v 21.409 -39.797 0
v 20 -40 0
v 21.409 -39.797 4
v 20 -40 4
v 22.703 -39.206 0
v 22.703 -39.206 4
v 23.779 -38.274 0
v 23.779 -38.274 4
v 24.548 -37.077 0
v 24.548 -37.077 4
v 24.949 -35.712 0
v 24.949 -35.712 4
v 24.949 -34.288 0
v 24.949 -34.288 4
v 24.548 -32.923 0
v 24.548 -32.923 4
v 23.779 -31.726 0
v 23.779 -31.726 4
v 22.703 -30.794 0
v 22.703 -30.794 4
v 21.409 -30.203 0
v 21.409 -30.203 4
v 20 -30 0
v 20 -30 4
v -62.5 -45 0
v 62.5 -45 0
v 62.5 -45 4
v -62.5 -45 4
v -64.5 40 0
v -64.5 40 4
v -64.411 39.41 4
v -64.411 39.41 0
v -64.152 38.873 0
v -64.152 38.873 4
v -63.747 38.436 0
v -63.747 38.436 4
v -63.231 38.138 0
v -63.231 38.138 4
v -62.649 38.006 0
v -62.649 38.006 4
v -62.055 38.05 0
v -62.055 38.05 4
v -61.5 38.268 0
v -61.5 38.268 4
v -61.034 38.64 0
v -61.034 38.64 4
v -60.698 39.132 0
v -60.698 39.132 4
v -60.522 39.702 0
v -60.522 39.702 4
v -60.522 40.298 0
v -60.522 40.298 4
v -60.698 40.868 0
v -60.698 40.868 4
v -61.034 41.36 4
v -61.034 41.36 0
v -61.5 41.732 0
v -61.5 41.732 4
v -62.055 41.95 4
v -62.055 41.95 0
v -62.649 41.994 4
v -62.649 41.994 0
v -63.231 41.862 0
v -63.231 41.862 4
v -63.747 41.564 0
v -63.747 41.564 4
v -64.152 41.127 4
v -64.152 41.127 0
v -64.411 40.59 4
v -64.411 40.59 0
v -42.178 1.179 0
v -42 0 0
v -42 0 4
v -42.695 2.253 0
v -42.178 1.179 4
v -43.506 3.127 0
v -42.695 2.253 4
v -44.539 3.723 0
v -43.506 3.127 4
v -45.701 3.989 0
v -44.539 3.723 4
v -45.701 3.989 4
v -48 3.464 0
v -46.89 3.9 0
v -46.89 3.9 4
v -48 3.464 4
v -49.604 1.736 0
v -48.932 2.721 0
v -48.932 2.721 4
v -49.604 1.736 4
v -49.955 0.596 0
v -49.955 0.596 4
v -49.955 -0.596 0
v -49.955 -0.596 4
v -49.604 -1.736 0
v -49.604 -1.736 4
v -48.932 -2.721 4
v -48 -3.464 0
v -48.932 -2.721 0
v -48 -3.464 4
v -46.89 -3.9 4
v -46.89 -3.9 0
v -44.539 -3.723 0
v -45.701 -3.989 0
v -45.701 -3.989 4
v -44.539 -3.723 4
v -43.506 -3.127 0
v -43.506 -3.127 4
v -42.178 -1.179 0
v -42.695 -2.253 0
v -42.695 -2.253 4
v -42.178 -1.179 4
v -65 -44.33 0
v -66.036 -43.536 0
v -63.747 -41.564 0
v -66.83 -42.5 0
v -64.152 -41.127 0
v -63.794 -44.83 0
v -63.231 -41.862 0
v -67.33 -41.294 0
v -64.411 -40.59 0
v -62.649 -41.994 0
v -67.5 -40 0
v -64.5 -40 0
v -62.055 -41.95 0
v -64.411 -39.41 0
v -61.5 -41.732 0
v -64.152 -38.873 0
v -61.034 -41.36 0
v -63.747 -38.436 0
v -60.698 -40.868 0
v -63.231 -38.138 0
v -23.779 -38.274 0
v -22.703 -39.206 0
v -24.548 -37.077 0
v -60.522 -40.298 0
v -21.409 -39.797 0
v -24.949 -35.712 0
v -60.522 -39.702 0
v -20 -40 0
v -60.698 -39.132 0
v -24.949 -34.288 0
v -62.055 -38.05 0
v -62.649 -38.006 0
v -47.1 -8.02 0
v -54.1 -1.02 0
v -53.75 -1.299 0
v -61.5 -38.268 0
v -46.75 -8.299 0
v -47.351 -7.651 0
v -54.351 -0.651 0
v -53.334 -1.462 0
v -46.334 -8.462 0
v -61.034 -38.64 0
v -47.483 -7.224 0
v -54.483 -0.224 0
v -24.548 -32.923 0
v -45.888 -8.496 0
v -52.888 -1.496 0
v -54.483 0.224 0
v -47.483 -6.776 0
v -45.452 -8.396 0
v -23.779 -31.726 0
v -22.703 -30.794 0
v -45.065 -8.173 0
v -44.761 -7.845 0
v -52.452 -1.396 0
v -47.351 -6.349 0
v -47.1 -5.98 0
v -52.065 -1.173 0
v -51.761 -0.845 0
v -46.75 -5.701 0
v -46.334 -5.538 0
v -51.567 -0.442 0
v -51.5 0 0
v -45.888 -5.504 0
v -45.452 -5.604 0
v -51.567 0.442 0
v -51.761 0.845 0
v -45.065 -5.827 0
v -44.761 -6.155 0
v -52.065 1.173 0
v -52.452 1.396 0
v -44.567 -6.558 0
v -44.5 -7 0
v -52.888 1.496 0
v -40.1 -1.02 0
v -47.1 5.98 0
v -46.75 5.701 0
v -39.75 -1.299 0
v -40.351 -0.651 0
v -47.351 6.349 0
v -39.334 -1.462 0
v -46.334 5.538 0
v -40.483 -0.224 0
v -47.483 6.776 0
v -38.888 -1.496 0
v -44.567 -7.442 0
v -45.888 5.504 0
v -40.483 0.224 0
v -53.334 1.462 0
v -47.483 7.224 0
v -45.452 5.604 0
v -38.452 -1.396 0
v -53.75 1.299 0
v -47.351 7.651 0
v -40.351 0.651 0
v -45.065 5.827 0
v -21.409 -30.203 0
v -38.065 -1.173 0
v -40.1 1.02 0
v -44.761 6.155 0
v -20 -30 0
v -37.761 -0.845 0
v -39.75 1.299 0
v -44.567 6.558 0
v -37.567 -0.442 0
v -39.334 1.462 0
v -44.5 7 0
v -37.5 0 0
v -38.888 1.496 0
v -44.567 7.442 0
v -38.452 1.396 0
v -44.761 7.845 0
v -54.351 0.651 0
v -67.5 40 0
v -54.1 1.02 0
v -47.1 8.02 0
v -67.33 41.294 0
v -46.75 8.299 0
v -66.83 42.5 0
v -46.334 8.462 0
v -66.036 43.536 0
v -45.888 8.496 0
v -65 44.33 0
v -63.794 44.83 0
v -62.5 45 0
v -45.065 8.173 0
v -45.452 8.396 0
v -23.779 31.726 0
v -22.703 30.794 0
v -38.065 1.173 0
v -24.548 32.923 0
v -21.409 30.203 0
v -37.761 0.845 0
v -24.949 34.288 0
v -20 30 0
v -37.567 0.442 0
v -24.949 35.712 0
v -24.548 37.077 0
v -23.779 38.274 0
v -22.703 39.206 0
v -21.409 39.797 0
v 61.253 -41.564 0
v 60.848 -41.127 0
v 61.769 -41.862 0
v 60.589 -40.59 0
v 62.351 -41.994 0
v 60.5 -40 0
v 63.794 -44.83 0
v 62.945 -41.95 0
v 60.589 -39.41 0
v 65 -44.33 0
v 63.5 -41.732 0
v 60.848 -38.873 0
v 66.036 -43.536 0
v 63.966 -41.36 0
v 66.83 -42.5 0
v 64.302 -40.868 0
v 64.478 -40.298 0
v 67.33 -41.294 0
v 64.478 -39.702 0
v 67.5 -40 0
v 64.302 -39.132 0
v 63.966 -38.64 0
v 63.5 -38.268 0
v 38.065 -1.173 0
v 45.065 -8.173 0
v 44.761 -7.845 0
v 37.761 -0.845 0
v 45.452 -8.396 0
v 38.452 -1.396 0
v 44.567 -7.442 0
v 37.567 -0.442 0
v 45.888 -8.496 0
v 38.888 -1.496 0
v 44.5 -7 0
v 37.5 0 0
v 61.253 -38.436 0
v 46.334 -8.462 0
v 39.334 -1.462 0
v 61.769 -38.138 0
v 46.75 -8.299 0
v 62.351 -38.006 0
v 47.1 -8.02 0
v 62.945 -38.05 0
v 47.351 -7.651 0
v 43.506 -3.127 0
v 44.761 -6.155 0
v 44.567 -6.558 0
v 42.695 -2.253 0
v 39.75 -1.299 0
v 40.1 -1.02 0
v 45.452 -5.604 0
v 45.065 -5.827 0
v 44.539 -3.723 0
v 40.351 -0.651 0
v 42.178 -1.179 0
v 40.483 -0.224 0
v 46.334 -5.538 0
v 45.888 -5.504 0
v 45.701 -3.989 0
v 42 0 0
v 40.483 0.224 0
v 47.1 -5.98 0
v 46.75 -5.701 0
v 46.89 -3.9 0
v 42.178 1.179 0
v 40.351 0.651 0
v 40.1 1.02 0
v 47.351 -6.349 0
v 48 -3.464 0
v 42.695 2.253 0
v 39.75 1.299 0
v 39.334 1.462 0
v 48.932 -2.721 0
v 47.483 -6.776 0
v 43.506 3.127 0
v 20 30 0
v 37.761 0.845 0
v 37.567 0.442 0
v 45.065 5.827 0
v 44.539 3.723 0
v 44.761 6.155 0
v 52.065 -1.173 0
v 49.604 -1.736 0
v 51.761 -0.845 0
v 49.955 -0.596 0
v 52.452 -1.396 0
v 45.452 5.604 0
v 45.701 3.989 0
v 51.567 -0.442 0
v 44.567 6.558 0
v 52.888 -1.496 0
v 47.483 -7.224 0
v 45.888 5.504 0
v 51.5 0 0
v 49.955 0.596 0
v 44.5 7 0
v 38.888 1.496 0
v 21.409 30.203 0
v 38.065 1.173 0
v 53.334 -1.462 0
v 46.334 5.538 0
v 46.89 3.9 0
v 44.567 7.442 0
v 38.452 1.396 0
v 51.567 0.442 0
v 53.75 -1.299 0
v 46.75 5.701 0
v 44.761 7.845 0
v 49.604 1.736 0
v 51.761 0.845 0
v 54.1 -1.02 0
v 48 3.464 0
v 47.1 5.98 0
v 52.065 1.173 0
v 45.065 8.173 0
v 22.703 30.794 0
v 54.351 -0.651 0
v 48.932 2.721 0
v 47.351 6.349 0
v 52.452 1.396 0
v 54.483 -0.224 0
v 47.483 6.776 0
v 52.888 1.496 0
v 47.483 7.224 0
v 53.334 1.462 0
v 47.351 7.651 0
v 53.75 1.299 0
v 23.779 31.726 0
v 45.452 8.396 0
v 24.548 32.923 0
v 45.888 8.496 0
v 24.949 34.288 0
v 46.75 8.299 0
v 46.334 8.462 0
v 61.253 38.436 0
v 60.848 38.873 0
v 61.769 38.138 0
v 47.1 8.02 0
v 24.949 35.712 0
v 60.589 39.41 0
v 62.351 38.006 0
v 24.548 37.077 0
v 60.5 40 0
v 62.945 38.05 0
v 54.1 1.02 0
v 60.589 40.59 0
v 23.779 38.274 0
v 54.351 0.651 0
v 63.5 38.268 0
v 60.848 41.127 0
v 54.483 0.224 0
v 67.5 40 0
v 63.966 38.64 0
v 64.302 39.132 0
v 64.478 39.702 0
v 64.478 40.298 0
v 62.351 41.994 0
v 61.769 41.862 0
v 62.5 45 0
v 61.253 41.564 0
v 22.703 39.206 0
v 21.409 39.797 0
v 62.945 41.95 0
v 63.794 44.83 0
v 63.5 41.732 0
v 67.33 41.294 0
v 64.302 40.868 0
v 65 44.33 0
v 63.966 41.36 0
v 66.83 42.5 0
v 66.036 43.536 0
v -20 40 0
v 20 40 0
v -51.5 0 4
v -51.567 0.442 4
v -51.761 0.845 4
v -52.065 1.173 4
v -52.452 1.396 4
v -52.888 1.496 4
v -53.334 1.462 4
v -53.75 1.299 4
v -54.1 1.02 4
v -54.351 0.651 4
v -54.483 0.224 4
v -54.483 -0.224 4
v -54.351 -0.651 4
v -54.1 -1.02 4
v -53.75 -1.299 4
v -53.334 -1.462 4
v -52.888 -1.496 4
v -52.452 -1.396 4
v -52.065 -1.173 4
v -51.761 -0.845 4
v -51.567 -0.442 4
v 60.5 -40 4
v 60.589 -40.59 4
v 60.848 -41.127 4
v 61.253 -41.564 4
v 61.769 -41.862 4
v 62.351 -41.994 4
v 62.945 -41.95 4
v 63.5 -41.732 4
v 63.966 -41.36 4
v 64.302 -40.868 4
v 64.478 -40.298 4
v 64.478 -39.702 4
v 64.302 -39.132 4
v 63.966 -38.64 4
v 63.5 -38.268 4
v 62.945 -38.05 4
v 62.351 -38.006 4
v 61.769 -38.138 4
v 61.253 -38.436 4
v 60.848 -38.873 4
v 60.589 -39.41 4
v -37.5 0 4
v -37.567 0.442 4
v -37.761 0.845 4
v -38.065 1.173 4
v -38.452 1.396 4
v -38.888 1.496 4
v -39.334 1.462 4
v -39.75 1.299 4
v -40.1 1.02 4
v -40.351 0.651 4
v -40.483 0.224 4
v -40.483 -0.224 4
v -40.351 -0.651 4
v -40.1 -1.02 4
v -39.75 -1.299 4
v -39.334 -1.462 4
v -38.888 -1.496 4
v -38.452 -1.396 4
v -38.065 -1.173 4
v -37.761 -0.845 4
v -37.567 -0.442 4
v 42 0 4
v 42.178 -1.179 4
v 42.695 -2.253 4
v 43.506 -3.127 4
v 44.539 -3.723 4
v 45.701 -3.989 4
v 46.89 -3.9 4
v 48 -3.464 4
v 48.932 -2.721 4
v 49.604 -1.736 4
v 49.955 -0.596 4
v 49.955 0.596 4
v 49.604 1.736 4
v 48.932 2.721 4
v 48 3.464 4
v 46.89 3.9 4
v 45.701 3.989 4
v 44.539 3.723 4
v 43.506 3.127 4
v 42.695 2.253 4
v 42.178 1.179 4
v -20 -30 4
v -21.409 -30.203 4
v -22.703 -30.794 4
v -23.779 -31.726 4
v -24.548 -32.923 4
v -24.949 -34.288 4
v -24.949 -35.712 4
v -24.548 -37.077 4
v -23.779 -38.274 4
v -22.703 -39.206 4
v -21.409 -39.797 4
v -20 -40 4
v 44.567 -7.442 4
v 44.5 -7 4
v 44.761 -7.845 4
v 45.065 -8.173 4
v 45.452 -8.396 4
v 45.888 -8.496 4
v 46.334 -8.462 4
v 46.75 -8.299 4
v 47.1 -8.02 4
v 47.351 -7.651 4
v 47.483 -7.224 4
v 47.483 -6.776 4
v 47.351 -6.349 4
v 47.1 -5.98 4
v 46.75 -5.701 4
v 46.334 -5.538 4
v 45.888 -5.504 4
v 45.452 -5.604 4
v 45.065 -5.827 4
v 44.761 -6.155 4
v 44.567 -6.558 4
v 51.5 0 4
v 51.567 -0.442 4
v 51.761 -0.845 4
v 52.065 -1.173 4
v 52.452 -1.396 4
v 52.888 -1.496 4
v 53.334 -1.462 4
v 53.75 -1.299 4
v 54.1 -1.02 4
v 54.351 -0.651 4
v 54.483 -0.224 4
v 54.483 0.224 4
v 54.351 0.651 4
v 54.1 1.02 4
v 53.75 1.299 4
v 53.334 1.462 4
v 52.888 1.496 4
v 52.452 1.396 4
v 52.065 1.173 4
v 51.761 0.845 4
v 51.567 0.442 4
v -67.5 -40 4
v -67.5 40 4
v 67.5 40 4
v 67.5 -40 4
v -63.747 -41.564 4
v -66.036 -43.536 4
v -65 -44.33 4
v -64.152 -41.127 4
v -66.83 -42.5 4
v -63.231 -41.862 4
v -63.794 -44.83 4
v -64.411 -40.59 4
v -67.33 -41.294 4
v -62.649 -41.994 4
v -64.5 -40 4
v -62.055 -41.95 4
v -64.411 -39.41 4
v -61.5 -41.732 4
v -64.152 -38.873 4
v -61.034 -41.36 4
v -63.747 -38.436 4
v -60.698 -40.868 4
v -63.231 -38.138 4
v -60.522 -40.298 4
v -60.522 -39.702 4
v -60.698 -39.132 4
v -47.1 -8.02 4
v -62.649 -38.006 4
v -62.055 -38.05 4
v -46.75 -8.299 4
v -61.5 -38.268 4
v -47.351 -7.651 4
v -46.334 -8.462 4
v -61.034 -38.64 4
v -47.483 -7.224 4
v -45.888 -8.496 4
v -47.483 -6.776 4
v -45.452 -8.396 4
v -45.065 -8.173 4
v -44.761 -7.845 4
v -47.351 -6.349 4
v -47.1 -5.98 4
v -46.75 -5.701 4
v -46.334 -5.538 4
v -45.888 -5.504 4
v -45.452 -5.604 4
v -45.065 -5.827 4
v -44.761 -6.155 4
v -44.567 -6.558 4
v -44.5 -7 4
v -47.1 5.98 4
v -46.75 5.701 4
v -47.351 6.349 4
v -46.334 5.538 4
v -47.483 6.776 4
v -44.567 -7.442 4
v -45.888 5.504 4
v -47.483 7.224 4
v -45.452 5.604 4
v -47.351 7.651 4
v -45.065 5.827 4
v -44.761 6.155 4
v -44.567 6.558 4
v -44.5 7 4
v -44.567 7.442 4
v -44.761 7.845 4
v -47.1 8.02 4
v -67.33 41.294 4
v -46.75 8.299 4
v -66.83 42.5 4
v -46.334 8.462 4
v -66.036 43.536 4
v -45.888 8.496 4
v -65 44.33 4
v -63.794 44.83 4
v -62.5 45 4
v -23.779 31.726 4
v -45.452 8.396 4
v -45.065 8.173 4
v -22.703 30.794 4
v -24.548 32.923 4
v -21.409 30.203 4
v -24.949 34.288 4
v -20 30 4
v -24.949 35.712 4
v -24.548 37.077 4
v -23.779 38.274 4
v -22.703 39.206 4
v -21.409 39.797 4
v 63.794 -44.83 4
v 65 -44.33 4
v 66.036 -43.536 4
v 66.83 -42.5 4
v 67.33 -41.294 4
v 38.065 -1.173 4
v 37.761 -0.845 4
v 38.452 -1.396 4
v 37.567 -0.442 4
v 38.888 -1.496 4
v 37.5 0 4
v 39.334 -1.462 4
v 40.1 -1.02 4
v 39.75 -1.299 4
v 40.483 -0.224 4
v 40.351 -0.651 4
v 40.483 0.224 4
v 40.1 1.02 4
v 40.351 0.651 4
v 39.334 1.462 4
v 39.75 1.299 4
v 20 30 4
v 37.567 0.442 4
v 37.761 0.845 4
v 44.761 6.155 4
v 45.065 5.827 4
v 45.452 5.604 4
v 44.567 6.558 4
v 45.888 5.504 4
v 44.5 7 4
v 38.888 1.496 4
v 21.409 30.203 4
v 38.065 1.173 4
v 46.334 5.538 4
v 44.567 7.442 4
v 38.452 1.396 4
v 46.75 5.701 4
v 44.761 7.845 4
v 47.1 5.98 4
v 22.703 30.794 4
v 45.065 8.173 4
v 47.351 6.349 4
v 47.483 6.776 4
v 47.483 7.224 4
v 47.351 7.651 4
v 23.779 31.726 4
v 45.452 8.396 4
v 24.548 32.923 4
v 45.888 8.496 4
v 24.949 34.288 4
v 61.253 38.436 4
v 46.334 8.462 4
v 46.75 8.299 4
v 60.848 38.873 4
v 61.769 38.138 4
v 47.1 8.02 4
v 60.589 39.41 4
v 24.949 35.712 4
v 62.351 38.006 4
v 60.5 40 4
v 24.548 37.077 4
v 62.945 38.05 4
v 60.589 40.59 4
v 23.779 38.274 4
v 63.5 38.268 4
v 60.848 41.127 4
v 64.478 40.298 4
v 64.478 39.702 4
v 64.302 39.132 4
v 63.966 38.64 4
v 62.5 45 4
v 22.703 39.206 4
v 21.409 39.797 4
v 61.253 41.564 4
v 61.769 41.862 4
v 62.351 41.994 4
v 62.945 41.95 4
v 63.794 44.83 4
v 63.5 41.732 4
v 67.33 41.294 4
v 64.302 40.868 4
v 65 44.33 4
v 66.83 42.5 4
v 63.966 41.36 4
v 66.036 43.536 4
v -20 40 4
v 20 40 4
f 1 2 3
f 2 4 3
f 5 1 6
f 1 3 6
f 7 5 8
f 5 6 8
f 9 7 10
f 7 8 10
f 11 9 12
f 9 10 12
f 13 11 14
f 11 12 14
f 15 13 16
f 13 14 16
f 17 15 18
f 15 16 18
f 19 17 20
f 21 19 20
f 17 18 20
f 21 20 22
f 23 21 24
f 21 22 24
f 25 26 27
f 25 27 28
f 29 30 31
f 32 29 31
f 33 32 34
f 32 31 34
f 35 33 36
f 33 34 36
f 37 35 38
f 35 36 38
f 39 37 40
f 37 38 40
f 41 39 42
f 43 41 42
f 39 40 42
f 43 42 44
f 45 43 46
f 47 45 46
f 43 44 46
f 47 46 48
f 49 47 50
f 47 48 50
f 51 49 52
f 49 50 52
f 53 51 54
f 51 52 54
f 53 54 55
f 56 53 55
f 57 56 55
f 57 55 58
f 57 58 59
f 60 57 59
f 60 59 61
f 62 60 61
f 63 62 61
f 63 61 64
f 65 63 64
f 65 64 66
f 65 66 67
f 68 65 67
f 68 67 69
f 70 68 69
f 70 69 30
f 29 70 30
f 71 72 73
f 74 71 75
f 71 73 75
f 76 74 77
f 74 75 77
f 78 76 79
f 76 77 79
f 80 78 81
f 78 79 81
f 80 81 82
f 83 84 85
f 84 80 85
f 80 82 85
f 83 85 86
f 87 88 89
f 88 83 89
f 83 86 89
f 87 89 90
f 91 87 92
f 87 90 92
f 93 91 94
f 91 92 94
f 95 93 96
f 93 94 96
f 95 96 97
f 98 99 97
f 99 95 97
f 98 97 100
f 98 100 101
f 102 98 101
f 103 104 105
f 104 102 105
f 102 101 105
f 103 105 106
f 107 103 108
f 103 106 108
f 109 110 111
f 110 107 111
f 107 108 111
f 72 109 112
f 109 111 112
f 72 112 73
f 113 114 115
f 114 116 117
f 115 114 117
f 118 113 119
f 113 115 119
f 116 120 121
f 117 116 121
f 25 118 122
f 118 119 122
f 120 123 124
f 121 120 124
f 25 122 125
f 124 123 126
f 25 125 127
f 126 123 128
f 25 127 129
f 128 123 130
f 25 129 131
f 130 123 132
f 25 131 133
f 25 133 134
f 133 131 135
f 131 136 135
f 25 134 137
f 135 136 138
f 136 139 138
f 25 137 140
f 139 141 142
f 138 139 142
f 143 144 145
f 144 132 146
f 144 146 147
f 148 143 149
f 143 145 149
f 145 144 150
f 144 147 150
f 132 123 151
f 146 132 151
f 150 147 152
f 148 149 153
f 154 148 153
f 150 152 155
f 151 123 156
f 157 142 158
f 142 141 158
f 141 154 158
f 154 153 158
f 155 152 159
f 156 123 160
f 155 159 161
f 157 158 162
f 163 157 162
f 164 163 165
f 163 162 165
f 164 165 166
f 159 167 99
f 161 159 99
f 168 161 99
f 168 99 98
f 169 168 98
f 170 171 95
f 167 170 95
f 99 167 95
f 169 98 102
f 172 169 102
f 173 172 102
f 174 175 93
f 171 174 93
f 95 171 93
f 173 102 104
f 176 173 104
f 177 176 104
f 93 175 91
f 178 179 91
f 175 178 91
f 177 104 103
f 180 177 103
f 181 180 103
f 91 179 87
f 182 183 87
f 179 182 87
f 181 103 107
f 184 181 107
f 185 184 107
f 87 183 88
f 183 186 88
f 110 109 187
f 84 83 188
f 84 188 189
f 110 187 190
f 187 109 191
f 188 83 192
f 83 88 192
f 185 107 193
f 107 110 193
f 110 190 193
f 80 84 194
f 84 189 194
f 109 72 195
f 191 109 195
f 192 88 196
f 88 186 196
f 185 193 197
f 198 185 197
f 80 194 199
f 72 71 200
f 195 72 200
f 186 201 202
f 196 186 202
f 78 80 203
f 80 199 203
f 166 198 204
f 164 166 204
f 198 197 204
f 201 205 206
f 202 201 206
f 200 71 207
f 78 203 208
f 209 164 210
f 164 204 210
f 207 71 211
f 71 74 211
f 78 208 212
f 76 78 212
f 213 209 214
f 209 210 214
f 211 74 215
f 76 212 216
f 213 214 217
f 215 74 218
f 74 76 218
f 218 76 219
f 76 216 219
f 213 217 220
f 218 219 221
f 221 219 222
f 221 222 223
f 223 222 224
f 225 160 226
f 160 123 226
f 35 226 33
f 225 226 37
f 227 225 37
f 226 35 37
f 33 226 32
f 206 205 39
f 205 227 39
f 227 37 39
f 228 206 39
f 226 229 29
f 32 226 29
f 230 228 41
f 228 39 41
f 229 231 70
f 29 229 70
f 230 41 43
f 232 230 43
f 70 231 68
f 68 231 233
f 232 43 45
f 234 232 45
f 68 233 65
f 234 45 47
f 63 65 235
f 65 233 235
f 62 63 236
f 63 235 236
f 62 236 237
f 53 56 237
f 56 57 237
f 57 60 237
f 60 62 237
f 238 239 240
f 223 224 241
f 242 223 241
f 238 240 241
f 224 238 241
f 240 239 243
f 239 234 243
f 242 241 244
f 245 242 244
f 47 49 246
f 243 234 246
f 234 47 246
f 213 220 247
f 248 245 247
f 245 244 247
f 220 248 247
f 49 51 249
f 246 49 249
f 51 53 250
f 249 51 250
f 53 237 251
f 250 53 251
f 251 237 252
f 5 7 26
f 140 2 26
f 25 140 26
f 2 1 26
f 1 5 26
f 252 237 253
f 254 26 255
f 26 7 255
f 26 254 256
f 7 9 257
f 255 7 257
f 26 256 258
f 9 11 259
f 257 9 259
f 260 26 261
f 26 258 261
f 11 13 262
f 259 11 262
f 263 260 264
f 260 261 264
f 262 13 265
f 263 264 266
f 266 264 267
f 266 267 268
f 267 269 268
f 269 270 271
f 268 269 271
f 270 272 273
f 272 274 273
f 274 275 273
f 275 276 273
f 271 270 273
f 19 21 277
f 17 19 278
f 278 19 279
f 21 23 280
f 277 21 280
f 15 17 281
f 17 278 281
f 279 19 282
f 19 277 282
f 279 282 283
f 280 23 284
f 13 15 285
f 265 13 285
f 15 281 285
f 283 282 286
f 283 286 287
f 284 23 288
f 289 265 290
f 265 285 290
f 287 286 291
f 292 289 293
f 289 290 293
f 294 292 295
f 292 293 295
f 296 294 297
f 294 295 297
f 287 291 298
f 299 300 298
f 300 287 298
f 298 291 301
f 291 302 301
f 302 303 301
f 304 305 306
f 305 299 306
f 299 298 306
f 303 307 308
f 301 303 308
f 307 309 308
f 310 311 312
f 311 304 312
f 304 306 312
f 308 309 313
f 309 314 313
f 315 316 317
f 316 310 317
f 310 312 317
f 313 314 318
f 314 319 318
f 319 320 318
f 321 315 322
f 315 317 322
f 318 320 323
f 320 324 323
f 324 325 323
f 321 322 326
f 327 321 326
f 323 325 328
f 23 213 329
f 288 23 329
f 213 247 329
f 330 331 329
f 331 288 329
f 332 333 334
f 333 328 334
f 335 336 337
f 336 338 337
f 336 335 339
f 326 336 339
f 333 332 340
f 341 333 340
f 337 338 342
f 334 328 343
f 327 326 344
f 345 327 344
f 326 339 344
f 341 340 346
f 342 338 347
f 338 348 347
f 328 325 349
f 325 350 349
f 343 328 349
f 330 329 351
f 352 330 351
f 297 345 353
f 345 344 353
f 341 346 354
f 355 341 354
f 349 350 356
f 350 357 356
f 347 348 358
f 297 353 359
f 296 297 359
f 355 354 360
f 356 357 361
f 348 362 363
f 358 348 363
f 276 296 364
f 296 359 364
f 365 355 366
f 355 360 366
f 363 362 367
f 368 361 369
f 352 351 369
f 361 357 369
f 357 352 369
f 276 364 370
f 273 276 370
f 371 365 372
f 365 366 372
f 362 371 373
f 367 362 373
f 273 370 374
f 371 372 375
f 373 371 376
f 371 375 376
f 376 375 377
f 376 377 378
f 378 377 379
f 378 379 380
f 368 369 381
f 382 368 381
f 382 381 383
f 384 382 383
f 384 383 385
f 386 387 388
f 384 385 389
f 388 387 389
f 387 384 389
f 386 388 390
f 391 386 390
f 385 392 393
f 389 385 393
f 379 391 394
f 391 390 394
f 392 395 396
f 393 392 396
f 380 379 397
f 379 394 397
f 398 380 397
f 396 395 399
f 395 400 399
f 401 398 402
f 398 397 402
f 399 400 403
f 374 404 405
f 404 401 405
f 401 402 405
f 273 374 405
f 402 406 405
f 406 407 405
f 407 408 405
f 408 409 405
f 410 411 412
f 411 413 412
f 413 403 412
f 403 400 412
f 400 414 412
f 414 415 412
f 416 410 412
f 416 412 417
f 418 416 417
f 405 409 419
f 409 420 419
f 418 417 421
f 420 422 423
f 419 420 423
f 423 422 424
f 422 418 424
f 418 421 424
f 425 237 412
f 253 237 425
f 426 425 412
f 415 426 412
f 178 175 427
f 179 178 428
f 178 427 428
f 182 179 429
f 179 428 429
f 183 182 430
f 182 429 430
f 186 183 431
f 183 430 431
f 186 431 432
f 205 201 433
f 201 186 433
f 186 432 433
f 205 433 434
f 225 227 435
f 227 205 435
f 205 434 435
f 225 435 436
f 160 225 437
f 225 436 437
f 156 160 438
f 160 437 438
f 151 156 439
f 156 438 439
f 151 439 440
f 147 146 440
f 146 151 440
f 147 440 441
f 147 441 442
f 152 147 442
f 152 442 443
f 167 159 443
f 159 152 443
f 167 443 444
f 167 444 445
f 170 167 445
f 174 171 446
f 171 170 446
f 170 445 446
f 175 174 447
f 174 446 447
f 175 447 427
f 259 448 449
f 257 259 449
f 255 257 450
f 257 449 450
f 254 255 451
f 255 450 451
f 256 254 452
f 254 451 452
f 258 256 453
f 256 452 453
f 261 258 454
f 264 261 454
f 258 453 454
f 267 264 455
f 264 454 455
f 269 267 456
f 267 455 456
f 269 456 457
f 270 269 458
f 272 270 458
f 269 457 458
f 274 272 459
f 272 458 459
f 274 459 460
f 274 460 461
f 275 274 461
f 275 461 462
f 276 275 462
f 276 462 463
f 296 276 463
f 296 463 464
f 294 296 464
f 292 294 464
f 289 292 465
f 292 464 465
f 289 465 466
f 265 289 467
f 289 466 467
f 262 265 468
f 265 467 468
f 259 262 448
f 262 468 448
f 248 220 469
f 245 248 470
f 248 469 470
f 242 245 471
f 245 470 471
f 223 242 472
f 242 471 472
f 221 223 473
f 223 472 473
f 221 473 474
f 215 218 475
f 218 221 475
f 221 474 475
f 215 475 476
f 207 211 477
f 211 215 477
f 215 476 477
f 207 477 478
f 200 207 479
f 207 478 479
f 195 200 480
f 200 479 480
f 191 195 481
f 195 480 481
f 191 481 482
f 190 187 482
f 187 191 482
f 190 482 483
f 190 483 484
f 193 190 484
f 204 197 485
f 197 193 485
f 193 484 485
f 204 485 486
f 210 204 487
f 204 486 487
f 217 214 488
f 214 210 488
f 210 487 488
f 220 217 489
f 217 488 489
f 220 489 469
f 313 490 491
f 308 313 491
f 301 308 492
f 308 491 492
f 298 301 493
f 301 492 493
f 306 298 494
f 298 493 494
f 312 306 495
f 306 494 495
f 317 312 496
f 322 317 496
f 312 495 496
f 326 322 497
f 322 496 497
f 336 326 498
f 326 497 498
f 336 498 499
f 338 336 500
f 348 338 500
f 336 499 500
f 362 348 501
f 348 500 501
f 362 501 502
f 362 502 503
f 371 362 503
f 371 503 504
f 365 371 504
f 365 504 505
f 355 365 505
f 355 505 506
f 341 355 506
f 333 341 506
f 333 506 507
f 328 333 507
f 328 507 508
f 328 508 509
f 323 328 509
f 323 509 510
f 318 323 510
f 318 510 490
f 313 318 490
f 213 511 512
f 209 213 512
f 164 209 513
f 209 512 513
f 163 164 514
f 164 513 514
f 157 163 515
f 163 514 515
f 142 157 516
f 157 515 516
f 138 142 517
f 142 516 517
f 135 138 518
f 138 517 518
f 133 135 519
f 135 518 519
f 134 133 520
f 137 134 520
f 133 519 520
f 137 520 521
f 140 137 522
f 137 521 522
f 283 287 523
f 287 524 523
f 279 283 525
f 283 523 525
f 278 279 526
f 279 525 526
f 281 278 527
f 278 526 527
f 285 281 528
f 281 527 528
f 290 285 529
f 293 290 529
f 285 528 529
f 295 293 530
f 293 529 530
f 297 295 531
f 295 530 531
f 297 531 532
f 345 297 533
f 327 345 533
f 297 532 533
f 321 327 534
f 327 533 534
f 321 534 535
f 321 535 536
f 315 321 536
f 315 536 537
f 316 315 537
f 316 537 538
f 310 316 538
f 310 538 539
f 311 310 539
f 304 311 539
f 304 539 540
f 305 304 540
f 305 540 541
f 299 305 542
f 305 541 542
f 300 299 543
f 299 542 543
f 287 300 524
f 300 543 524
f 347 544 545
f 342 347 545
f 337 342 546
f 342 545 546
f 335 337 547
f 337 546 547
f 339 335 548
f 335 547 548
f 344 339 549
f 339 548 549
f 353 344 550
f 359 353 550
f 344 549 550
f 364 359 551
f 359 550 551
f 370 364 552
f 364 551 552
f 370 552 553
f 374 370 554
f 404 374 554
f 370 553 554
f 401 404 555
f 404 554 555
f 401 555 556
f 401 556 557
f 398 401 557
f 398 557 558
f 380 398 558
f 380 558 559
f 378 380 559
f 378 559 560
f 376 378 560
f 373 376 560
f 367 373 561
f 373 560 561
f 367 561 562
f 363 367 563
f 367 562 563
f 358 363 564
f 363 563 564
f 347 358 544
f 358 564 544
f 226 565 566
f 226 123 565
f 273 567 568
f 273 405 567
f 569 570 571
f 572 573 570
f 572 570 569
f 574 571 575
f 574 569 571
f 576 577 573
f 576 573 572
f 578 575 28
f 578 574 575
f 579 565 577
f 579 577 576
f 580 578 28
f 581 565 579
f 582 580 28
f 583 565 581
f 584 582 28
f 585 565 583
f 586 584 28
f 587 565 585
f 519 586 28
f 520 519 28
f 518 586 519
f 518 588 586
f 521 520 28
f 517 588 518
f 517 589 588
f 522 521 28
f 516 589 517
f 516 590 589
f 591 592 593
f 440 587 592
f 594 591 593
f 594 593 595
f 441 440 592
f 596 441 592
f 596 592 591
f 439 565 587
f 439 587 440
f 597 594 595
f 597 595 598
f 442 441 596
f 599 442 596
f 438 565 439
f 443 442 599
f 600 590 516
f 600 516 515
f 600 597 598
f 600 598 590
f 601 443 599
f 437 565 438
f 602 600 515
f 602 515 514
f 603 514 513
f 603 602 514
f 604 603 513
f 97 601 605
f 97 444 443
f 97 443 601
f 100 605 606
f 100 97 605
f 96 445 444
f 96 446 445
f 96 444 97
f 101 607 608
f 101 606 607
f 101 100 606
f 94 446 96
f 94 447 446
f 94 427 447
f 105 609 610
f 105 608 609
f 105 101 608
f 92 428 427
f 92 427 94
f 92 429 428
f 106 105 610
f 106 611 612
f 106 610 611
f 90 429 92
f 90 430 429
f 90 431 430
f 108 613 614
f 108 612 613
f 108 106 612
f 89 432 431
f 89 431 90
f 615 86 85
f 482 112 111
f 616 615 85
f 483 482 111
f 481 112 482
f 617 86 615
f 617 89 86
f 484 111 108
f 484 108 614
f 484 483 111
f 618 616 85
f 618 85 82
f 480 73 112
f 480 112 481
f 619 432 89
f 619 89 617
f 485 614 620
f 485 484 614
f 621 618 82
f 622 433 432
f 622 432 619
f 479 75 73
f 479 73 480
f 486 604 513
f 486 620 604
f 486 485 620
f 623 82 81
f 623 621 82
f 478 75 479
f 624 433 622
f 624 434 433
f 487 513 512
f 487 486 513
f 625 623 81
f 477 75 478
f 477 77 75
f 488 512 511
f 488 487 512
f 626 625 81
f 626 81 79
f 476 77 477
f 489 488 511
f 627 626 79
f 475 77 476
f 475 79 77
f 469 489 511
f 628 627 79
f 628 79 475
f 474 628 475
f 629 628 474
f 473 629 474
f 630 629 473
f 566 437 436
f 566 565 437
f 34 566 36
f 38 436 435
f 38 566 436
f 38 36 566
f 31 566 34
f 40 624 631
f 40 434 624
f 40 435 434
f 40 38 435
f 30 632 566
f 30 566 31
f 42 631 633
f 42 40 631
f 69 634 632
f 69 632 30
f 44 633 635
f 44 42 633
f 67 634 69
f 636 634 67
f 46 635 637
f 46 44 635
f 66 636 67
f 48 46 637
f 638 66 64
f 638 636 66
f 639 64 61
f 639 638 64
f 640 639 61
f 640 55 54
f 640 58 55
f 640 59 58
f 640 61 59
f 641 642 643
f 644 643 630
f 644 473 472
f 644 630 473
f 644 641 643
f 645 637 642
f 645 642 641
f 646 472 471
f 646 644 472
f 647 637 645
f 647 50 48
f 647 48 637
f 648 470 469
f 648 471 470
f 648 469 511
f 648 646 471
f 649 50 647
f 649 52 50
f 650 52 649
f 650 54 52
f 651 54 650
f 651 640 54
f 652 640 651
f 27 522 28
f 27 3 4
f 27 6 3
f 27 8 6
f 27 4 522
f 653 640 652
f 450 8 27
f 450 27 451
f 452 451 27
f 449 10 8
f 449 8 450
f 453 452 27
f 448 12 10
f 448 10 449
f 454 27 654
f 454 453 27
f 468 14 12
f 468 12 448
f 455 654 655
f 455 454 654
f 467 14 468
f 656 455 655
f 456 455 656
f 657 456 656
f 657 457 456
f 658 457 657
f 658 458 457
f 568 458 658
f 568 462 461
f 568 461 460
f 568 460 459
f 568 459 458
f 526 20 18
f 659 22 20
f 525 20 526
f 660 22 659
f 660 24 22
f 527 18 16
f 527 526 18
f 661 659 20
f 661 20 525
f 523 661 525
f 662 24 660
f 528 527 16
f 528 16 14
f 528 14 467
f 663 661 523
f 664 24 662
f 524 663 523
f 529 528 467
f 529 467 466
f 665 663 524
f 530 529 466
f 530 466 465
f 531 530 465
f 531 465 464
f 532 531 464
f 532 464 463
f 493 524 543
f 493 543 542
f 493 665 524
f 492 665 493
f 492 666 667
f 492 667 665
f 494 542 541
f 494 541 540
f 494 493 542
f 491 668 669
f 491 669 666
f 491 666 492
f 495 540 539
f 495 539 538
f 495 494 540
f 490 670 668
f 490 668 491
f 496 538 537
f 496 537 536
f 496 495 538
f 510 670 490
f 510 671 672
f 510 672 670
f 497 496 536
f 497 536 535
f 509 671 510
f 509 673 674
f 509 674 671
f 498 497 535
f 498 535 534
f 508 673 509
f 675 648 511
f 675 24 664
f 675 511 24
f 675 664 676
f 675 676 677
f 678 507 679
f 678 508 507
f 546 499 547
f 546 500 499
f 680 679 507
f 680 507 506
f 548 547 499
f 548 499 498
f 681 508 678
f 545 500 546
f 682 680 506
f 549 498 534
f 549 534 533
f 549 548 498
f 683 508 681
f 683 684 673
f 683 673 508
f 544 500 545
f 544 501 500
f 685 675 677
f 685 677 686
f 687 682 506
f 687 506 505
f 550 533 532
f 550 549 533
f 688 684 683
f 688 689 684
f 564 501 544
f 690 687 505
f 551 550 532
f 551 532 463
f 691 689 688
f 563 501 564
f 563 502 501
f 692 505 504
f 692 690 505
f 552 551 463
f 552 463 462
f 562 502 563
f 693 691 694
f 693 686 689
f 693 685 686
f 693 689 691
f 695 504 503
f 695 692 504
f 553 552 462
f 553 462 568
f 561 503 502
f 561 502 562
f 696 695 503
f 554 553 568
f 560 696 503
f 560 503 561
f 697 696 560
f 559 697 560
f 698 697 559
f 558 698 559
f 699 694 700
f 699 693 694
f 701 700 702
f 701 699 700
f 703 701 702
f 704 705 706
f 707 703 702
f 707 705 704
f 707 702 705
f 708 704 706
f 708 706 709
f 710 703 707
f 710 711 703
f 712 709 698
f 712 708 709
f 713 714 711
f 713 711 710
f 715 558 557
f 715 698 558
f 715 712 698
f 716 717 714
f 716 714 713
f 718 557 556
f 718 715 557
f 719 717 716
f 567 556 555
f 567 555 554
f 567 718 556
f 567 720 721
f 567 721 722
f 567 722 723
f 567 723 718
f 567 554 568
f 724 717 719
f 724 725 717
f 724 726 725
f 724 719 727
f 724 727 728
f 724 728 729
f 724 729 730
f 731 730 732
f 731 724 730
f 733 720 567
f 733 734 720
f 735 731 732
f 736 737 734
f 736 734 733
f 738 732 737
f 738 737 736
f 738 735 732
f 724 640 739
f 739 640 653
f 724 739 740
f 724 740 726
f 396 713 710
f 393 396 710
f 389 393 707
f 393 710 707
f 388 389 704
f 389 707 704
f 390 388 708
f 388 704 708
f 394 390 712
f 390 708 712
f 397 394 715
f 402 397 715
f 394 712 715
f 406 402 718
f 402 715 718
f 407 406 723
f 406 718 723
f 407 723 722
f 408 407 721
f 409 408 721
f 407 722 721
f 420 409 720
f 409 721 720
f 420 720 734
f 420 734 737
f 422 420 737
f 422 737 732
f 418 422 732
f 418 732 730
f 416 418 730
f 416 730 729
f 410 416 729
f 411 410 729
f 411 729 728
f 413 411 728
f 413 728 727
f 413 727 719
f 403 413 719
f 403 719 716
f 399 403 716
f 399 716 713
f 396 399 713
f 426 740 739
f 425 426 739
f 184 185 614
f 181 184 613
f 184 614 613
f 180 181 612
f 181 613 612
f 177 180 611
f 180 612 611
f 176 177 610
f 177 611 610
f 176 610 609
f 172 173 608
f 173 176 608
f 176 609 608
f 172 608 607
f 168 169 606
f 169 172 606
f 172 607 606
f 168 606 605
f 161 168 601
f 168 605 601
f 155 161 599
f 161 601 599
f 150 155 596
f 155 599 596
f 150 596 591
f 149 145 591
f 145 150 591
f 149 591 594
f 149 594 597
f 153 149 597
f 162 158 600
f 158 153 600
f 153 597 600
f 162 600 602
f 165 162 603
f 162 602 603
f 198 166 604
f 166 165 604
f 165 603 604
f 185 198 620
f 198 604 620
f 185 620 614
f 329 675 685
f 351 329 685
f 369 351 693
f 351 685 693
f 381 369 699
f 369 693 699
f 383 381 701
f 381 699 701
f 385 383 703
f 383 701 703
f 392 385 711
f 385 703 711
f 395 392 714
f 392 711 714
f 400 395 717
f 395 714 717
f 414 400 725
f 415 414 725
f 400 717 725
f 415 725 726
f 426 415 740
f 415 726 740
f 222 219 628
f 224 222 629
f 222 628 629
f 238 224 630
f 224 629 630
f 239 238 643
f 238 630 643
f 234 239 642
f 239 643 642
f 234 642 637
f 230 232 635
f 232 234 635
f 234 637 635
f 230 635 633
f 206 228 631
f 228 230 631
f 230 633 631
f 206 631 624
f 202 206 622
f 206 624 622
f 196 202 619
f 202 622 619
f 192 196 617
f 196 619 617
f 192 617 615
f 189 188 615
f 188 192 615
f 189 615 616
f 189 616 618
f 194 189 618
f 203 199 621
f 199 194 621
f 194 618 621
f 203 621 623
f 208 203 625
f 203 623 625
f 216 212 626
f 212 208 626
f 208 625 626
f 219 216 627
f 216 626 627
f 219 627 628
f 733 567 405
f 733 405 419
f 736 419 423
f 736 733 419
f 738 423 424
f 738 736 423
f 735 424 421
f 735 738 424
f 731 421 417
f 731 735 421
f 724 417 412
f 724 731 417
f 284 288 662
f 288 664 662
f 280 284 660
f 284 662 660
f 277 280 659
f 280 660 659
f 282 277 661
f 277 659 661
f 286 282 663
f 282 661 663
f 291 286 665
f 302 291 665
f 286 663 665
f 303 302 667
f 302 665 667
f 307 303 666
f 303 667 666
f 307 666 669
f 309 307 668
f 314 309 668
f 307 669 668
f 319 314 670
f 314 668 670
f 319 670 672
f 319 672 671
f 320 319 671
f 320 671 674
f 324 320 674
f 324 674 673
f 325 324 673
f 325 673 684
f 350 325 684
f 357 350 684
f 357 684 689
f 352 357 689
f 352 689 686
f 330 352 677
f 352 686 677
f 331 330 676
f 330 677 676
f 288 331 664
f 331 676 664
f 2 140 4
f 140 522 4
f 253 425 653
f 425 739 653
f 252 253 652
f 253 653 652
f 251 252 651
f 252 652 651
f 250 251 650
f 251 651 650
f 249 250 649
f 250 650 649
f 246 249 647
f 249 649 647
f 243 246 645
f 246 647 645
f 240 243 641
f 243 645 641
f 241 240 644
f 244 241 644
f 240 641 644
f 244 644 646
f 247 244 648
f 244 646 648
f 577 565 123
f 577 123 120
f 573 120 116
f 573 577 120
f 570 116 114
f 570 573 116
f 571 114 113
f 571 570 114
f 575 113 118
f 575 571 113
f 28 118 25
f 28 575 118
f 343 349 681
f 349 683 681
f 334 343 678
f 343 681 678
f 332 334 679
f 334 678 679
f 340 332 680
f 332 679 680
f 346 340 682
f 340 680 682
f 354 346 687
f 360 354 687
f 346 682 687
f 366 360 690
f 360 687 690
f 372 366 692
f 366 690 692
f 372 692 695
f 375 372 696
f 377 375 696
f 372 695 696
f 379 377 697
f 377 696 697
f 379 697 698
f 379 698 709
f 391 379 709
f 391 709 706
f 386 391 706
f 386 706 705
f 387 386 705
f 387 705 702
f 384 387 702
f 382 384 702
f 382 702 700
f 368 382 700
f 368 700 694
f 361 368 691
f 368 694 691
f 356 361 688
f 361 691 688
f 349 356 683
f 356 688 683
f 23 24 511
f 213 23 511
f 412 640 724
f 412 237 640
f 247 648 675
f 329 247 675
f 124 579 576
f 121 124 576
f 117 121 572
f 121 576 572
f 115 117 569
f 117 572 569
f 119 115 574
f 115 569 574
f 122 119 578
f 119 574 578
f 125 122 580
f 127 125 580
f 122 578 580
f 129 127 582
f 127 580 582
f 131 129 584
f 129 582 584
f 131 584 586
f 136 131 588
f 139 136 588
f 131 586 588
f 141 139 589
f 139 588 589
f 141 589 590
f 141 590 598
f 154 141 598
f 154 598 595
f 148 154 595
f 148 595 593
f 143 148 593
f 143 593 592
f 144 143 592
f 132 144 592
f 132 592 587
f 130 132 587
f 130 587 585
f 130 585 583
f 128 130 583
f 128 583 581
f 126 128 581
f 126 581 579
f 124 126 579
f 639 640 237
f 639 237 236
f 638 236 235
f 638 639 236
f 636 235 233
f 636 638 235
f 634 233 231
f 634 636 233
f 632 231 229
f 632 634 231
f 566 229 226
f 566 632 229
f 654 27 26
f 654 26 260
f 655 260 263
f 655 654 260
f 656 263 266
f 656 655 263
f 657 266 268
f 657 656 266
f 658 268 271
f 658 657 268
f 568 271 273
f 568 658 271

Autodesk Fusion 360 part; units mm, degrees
sketch "Boceto1" plane through (0, 0, 0) normal (0, 0, 1) x (1, 0, 0)
  line L0 (-67.5, 45) -> (67.5, 45)
  line L1 (67.5, 45) -> (67.5, -45)
  line L2 (67.5, -45) -> (-67.5, -45)
  line L3 (-67.5, -45) -> (-67.5, 45)
  line L4 (-67.5, 45) -> (67.5, -45) construction
  line L5 (67.5, 45) -> (-67.5, -45) construction
  dimension "d1" = 135
  dimension "d2" = 90
extrude "Extruir1" add sketch "Boceto1" along normal blind 4
sketch "Boceto2" plane through (0, 0, 4) normal (0, 0, 1) x (-1, 0, 0)
  line L0 (67.5, 45) -> (-67.5, 45)
  line L1 (-67.5, 45) -> (-67.5, -45)
  line L2 (-67.5, -45) -> (67.5, -45)
  line L3 (67.5, -45) -> (67.5, 45)
  line L4 (67.5, -45) -> (67.5, -40)
  line L5 (67.5, -40) -> (62.5, -40)
  line L6 (67.5, 45) -> (62.5, 45)
  line L7 (62.5, 45) -> (62.5, 40)
  line L8 (-67.5, -45) -> (-62.5, -45)
  line L9 (-62.5, -45) -> (-62.5, -40)
  line L10 (-67.5, 45) -> (-67.5, 40)
  line L11 (-67.5, 40) -> (-62.5, 40)
  circle A0 centre (62.5, -40) radius 2
  circle A1 centre (62.5, 40) radius 2
  circle A2 centre (-62.5, -40) radius 2
  circle A3 centre (-62.5, 40) radius 2
  dimension "d5" = 5
  dimension "d6" = 5
  dimension "d7" = 135
  dimension "d8" = 90
  dimension "d9" = 5
  dimension "d10" = 5
  dimension "d11" = 5
  dimension "d12" = 5
  dimension "d13" = 5
  dimension "d14" = 5
  dimension "d15" = 4
  dimension "d16" = 4
  dimension "d17" = 4
  dimension "d18" = 4
extrude "Extruir2" cut sketch "Boceto2" against normal blind 4 contours A1 | A3 | A2 | A0
fillet "Empalme1" radius 5 4 edges at (-67.5, -45, 2) (67.5, -45, 2) (67.5, 45, 2) (-67.5, 45, 2)
sketch "Boceto3" plane through (0, 0, 4) normal (0, 0, 1) x (-1, 0, 0)
  circle A0 centre (62.5, 40) radius 2
  circle A1 centre (-62.5, -40) radius 2
  circle A2 centre (62.5, -40) radius 2
  circle A3 centre (-62.5, 40) radius 2
  arc A4 (62.5, -45) -> (67.5, -40) centre (62.5, -40) ccw
  line L0 (67.5, -40) -> (67.5, 40)
  arc A5 (67.5, 40) -> (62.5, 45) centre (62.5, 40) ccw
  line L1 (62.5, 45) -> (-62.5, 45)
  arc A6 (-62.5, 45) -> (-67.5, 40) centre (-62.5, 40) ccw
  line L2 (-67.5, 40) -> (-67.5, -40)
  arc A7 (-67.5, -40) -> (-62.5, -45) centre (-62.5, -40) ccw
  line L3 (-62.5, -45) -> (62.5, -45)
  line L4 (-67.5, 0) -> (-46, 0)
  circle A8 centre (-46, 0) radius 4
  circle A9 centre (-46, 0) radius 7
  line L5 (-46, 0) -> (-46, -7) construction
  line L6 (-46, 0) -> (-39, 0) construction
  line L7 (-46, 0) -> (-46, 7) construction
  line L8 (-46, 0) -> (-53, 0) construction
  circle A10 centre (-46, -7) radius 1.5
  circle A11 centre (-39, 0) radius 1.5
  circle A12 centre (-46, 7) radius 1.5
  circle A13 centre (-53, 0) radius 1.5
  dimension "d23" = 21.5
  dimension "d24" = 8
  dimension "d25" = 14
  dimension "d26" = 3
  dimension "d27" = 3
  dimension "d28" = 3
  dimension "d29" = 3
extrude "Extruir3" cut sketch "Boceto3" against normal blind 4 contours L4 A9 A13 | L4 A9 A13 | L4 A9 A13 | L4 A9 A13 | A8 | A9 A12 | A9 A12 | A9 A10 | A9 A10 | A9 A11 | A9 A11
mirror "Simetría1" about plane through (0, 0, 0) normal (1, 0, 0) of "Extruir3"
sketch "Boceto4" plane through (0, 0, 4) normal (0, 0, 1) x (-1, 0, 0)
  circle A0 centre (46, 7) radius 1.5
  circle A1 centre (46, -7) radius 1.5
  circle A2 centre (39, 0) radius 1.5
  circle A3 centre (53, 0) radius 1.5
  circle A4 centre (46, 0) radius 4
  arc A5 (62.5, -45) -> (67.5, -40) centre (62.5, -40) ccw
  line L0 (67.5, -40) -> (67.5, 40)
  arc A6 (67.5, 40) -> (62.5, 45) centre (62.5, 40) ccw
  line L1 (62.5, 45) -> (-62.5, 45)
  arc A7 (-62.5, 45) -> (-67.5, 40) centre (-62.5, 40) ccw
  line L2 (-67.5, 40) -> (-67.5, -40)
  arc A8 (-67.5, -40) -> (-62.5, -45) centre (-62.5, -40) ccw
  line L3 (-62.5, -45) -> (62.5, -45)
  circle A9 centre (-62.5, 40) radius 2
  circle A10 centre (62.5, -40) radius 2
  circle A11 centre (-62.5, -40) radius 2
  circle A12 centre (62.5, 40) radius 2
  circle A13 centre (-46, 7) radius 1.5
  circle A14 centre (-46, -7) radius 1.5
  circle A15 centre (-53, 0) radius 1.5
  circle A16 centre (-39, 0) radius 1.5
  circle A17 centre (-46, 0) radius 4
  line L4 (0, 35) -> (0, -35)
  line L5 (-20, -35) -> (20, -35)
  line L6 (-20, 35) -> (20, 35)
  line L7 (20, -30) -> (-20, -30)
  arc A18 (-20, -30) -> (-20, -40) centre (-20, -35) ccw
  line L8 (-20, -40) -> (20, -40)
  arc A19 (20, -40) -> (20, -30) centre (20, -35) ccw
  line L9 (20, -35) -> (-20, -35) construction
  line L10 (20, 40) -> (-20, 40)
  arc A20 (-20, 40) -> (-20, 30) centre (-20, 35) ccw
  line L11 (-20, 30) -> (20, 30)
  arc A21 (20, 30) -> (20, 40) centre (20, 35) ccw
  line L12 (20, 35) -> (-20, 35) construction
  dimension "d34" = 70
  dimension "d35" = 40
  dimension "d36" = 40
  dimension "d37" = 10
  dimension "d38" = 10
extrude "Extruir4" cut sketch "Boceto4" against normal blind 4 contours L7 A18 L8 A19 | L10 A20 L11 A21
